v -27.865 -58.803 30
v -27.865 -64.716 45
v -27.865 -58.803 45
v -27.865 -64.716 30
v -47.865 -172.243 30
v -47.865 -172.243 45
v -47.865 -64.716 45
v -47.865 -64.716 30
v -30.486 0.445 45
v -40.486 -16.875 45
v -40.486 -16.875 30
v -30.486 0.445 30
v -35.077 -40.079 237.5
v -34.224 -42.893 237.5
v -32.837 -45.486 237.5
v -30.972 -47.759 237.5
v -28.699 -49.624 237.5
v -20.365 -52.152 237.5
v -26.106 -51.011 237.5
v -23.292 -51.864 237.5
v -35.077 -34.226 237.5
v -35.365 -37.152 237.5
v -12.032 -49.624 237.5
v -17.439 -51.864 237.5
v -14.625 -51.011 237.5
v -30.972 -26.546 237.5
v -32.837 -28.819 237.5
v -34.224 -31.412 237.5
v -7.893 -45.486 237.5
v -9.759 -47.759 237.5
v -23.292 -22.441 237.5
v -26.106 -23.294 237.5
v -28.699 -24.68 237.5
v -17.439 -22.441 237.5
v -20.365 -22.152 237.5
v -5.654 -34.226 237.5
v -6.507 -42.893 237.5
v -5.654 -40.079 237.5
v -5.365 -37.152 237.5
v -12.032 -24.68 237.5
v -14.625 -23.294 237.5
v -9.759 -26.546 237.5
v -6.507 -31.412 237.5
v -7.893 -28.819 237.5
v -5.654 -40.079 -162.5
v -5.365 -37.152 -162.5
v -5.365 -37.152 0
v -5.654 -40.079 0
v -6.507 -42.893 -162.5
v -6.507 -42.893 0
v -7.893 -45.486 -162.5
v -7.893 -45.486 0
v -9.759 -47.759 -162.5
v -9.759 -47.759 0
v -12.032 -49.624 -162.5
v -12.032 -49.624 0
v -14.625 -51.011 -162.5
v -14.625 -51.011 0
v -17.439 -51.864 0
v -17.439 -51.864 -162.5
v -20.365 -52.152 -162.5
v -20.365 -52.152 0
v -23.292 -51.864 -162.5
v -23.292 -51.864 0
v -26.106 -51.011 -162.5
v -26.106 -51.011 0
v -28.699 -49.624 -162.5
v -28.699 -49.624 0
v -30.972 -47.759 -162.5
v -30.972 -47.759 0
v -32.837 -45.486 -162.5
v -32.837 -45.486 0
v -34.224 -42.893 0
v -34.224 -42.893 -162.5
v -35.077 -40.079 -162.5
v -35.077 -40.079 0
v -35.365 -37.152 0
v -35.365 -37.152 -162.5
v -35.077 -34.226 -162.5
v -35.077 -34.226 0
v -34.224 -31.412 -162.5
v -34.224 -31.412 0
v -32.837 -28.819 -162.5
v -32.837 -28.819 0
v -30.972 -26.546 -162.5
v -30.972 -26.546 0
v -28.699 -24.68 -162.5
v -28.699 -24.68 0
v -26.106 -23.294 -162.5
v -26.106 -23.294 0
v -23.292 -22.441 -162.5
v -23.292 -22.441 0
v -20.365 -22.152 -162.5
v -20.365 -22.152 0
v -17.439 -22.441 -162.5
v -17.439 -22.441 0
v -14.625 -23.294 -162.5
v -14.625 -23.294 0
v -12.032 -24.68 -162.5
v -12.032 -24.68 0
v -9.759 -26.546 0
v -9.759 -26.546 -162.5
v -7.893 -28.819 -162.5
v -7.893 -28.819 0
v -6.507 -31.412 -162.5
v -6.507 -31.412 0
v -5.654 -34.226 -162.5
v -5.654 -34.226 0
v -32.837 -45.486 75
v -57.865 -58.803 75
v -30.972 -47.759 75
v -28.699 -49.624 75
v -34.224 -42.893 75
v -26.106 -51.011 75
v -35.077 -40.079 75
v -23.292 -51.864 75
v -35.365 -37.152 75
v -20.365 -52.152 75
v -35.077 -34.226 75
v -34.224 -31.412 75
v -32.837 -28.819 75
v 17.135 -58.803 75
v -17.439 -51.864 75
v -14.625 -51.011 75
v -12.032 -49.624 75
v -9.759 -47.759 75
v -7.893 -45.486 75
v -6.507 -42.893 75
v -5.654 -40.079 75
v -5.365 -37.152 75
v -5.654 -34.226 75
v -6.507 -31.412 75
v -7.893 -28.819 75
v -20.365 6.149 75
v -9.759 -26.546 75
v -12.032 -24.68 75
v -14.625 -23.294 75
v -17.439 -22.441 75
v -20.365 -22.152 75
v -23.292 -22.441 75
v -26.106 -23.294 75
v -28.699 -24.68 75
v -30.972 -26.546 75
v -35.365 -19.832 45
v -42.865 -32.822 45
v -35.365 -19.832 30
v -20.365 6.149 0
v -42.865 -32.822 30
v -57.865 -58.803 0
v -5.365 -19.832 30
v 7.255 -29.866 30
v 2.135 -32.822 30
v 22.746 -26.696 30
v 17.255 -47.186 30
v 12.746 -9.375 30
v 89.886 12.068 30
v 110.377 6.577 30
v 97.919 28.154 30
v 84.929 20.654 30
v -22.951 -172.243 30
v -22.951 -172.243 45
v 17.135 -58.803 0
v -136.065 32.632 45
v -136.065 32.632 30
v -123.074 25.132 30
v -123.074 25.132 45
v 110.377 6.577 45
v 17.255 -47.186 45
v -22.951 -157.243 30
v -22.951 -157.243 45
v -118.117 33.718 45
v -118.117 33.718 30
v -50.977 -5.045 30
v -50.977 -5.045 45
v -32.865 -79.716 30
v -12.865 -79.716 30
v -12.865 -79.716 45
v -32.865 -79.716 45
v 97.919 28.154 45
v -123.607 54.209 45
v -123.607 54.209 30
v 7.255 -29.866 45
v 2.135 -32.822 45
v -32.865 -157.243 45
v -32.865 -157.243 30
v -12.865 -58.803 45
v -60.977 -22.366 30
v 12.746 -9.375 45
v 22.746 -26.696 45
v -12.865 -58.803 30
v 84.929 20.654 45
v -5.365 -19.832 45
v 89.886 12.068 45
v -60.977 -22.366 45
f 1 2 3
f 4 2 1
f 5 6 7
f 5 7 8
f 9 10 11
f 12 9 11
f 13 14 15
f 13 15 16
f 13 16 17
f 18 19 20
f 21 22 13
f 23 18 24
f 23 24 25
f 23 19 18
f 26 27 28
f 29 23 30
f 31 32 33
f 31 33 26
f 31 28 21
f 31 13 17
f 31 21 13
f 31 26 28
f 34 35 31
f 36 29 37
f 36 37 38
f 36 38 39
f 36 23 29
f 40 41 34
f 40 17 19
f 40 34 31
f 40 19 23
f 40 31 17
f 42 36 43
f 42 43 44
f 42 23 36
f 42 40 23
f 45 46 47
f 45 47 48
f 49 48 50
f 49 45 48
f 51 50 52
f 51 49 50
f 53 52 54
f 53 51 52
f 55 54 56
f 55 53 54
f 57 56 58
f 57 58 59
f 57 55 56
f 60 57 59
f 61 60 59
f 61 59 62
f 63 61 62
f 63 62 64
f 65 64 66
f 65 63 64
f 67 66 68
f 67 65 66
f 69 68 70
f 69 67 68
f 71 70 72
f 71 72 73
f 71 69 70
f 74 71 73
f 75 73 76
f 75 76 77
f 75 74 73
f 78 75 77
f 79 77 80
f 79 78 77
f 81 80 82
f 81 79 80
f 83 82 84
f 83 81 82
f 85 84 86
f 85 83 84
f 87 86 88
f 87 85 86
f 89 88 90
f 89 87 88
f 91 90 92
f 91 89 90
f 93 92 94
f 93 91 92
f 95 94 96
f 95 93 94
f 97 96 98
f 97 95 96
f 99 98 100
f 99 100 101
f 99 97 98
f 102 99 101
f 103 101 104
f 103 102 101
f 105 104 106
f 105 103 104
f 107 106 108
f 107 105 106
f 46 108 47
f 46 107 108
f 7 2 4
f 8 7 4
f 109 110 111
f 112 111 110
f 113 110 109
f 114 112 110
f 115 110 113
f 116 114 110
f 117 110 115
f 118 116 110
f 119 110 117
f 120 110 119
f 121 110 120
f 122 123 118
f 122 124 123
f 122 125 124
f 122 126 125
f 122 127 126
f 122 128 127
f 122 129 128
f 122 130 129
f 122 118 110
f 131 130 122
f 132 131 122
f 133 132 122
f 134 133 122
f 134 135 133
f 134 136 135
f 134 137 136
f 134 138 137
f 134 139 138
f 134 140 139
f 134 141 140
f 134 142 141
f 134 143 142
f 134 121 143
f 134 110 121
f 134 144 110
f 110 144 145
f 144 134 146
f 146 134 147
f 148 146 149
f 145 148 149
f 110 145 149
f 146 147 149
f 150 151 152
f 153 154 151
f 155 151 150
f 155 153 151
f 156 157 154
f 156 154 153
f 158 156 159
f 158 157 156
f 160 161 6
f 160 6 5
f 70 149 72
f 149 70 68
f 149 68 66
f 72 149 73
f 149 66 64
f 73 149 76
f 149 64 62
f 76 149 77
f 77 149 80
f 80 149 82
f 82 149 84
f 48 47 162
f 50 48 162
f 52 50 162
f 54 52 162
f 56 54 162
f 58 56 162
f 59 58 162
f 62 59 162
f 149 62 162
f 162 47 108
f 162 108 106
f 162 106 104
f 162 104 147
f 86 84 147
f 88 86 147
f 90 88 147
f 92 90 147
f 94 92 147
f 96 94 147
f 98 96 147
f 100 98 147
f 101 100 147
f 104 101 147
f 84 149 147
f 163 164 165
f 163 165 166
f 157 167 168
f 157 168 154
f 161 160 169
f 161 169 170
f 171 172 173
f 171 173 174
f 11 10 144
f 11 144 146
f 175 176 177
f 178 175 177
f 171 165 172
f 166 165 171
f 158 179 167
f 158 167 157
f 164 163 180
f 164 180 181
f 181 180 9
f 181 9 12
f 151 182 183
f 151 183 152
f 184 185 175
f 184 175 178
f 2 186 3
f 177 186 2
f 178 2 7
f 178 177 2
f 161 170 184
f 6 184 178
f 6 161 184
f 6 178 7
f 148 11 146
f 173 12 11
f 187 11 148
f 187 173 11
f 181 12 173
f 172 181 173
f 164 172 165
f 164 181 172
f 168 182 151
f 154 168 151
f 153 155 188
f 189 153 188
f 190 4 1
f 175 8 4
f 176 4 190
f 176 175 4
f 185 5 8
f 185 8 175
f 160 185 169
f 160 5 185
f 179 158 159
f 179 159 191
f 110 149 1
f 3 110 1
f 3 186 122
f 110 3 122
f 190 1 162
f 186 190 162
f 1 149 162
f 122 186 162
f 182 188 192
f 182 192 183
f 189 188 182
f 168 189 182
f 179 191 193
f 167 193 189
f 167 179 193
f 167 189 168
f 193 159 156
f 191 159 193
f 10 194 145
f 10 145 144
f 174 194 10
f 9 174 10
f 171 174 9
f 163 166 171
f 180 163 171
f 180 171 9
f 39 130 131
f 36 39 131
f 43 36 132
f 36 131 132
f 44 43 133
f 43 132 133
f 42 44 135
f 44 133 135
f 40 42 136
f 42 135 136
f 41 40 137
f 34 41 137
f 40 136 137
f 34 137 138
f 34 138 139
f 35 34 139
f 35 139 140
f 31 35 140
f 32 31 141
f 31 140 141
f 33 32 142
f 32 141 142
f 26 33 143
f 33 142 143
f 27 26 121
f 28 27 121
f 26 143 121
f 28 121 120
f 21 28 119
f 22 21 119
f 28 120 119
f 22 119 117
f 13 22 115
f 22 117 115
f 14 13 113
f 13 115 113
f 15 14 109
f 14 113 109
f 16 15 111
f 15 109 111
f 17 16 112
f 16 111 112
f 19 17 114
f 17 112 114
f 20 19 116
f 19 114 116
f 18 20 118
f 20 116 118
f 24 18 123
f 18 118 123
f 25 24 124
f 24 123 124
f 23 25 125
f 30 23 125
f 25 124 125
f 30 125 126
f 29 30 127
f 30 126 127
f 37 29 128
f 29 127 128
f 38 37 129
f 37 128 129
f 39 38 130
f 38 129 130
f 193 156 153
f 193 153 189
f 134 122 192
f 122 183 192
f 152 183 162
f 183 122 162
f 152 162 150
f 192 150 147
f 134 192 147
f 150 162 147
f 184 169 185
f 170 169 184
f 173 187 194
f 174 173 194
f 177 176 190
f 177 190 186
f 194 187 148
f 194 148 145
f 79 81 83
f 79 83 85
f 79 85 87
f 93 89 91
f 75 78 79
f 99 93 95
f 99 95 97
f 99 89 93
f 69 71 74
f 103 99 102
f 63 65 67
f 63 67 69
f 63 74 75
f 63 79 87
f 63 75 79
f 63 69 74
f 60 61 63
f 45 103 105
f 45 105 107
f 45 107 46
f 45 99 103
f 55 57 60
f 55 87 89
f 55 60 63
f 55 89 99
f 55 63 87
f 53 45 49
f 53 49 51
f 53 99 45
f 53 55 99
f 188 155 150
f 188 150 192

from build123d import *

# Parameters (mm, degrees)
BOSS_EXTRU_1_DEPTH           = 75
ESQUISSE3_R                  = 15
BOSS_EXTRU_2_DEPTH           = 162.5
BOSS_EXTRU_3_START           = 162.5
ESQUISSE4_R                  = 15
BOSS_EXTRU_3_DEPTH           = 162.5
ESQUISSE5_W                  = 15
ESQUISSE5_H                  = 15
R_P_TITION_CIRCULAIRE2_COUNT = 3


with BuildPart() as part:
    # Esquisse1 → Boss.-Extru.1 (new body)
    with BuildSketch(Plane.XY):
        Polygon((-20.36542333, 6.148938206), (-57.86542333, -58.802967077), (17.13457667, -58.802967077), align=None)
    extrude(amount=BOSS_EXTRU_1_DEPTH)

    # Esquisse3 → Boss.-Extru.2 (add)
    with BuildSketch(Plane.XY.offset(75)):
        with Locations((-20.36542333, -37.152331983)):
            Circle(ESQUISSE3_R)
    extrude(amount=BOSS_EXTRU_2_DEPTH)

    # Esquisse4 → Boss.-Extru.3 (add)
    with BuildSketch(Plane(origin=(0, 0, 0), x_dir=(-1, 0, 0), z_dir=(0, 0, -1)).offset(BOSS_EXTRU_3_START)):
        with Locations(Location((20.36542333, -37.152331983, 0), (0, 0, 180))):
            Circle(ESQUISSE4_R)
    extrude(amount=-BOSS_EXTRU_3_DEPTH)

    # Balayage1: sweep along a curve in space
    with BuildLine() as balayage1_path:
        Line((-12.950526791, -56.834039487, 37.5), (-12.950526791, -79.630989253, 37.5))
        Line((-12.950526791, -79.630989253, 37.5), (-32.950526791, -79.630989253, 37.5))
        Line((-32.950526791, -79.630989253, 37.5), (-32.950526791, -157.328083579, 37.5))
        Line((-32.950526791, -157.328083579, 37.5), (-22.950526791, -157.328083579, 37.5))
    # Esquisse5 → Balayage1 (sweep)
    with BuildSketch(Plane.XZ.offset(58.802967077)):
        with Locations((-20.36542333, 37.5)):
            Rectangle(ESQUISSE5_W, ESQUISSE5_H)
    balayage1 = sweep(path=balayage1_path.line, transition=Transition.RIGHT)

    # Répétition circulaire2: Balayage1 ×3 about axis
    r_p_tition_circulaire2_axis = Axis((-20.36542333, -37.152331983, 0), (0, 0, 1))
    for i in range(1, R_P_TITION_CIRCULAIRE2_COUNT):
        add(balayage1.rotate(r_p_tition_circulaire2_axis, i * 360 / R_P_TITION_CIRCULAIRE2_COUNT))


solid = part.part
